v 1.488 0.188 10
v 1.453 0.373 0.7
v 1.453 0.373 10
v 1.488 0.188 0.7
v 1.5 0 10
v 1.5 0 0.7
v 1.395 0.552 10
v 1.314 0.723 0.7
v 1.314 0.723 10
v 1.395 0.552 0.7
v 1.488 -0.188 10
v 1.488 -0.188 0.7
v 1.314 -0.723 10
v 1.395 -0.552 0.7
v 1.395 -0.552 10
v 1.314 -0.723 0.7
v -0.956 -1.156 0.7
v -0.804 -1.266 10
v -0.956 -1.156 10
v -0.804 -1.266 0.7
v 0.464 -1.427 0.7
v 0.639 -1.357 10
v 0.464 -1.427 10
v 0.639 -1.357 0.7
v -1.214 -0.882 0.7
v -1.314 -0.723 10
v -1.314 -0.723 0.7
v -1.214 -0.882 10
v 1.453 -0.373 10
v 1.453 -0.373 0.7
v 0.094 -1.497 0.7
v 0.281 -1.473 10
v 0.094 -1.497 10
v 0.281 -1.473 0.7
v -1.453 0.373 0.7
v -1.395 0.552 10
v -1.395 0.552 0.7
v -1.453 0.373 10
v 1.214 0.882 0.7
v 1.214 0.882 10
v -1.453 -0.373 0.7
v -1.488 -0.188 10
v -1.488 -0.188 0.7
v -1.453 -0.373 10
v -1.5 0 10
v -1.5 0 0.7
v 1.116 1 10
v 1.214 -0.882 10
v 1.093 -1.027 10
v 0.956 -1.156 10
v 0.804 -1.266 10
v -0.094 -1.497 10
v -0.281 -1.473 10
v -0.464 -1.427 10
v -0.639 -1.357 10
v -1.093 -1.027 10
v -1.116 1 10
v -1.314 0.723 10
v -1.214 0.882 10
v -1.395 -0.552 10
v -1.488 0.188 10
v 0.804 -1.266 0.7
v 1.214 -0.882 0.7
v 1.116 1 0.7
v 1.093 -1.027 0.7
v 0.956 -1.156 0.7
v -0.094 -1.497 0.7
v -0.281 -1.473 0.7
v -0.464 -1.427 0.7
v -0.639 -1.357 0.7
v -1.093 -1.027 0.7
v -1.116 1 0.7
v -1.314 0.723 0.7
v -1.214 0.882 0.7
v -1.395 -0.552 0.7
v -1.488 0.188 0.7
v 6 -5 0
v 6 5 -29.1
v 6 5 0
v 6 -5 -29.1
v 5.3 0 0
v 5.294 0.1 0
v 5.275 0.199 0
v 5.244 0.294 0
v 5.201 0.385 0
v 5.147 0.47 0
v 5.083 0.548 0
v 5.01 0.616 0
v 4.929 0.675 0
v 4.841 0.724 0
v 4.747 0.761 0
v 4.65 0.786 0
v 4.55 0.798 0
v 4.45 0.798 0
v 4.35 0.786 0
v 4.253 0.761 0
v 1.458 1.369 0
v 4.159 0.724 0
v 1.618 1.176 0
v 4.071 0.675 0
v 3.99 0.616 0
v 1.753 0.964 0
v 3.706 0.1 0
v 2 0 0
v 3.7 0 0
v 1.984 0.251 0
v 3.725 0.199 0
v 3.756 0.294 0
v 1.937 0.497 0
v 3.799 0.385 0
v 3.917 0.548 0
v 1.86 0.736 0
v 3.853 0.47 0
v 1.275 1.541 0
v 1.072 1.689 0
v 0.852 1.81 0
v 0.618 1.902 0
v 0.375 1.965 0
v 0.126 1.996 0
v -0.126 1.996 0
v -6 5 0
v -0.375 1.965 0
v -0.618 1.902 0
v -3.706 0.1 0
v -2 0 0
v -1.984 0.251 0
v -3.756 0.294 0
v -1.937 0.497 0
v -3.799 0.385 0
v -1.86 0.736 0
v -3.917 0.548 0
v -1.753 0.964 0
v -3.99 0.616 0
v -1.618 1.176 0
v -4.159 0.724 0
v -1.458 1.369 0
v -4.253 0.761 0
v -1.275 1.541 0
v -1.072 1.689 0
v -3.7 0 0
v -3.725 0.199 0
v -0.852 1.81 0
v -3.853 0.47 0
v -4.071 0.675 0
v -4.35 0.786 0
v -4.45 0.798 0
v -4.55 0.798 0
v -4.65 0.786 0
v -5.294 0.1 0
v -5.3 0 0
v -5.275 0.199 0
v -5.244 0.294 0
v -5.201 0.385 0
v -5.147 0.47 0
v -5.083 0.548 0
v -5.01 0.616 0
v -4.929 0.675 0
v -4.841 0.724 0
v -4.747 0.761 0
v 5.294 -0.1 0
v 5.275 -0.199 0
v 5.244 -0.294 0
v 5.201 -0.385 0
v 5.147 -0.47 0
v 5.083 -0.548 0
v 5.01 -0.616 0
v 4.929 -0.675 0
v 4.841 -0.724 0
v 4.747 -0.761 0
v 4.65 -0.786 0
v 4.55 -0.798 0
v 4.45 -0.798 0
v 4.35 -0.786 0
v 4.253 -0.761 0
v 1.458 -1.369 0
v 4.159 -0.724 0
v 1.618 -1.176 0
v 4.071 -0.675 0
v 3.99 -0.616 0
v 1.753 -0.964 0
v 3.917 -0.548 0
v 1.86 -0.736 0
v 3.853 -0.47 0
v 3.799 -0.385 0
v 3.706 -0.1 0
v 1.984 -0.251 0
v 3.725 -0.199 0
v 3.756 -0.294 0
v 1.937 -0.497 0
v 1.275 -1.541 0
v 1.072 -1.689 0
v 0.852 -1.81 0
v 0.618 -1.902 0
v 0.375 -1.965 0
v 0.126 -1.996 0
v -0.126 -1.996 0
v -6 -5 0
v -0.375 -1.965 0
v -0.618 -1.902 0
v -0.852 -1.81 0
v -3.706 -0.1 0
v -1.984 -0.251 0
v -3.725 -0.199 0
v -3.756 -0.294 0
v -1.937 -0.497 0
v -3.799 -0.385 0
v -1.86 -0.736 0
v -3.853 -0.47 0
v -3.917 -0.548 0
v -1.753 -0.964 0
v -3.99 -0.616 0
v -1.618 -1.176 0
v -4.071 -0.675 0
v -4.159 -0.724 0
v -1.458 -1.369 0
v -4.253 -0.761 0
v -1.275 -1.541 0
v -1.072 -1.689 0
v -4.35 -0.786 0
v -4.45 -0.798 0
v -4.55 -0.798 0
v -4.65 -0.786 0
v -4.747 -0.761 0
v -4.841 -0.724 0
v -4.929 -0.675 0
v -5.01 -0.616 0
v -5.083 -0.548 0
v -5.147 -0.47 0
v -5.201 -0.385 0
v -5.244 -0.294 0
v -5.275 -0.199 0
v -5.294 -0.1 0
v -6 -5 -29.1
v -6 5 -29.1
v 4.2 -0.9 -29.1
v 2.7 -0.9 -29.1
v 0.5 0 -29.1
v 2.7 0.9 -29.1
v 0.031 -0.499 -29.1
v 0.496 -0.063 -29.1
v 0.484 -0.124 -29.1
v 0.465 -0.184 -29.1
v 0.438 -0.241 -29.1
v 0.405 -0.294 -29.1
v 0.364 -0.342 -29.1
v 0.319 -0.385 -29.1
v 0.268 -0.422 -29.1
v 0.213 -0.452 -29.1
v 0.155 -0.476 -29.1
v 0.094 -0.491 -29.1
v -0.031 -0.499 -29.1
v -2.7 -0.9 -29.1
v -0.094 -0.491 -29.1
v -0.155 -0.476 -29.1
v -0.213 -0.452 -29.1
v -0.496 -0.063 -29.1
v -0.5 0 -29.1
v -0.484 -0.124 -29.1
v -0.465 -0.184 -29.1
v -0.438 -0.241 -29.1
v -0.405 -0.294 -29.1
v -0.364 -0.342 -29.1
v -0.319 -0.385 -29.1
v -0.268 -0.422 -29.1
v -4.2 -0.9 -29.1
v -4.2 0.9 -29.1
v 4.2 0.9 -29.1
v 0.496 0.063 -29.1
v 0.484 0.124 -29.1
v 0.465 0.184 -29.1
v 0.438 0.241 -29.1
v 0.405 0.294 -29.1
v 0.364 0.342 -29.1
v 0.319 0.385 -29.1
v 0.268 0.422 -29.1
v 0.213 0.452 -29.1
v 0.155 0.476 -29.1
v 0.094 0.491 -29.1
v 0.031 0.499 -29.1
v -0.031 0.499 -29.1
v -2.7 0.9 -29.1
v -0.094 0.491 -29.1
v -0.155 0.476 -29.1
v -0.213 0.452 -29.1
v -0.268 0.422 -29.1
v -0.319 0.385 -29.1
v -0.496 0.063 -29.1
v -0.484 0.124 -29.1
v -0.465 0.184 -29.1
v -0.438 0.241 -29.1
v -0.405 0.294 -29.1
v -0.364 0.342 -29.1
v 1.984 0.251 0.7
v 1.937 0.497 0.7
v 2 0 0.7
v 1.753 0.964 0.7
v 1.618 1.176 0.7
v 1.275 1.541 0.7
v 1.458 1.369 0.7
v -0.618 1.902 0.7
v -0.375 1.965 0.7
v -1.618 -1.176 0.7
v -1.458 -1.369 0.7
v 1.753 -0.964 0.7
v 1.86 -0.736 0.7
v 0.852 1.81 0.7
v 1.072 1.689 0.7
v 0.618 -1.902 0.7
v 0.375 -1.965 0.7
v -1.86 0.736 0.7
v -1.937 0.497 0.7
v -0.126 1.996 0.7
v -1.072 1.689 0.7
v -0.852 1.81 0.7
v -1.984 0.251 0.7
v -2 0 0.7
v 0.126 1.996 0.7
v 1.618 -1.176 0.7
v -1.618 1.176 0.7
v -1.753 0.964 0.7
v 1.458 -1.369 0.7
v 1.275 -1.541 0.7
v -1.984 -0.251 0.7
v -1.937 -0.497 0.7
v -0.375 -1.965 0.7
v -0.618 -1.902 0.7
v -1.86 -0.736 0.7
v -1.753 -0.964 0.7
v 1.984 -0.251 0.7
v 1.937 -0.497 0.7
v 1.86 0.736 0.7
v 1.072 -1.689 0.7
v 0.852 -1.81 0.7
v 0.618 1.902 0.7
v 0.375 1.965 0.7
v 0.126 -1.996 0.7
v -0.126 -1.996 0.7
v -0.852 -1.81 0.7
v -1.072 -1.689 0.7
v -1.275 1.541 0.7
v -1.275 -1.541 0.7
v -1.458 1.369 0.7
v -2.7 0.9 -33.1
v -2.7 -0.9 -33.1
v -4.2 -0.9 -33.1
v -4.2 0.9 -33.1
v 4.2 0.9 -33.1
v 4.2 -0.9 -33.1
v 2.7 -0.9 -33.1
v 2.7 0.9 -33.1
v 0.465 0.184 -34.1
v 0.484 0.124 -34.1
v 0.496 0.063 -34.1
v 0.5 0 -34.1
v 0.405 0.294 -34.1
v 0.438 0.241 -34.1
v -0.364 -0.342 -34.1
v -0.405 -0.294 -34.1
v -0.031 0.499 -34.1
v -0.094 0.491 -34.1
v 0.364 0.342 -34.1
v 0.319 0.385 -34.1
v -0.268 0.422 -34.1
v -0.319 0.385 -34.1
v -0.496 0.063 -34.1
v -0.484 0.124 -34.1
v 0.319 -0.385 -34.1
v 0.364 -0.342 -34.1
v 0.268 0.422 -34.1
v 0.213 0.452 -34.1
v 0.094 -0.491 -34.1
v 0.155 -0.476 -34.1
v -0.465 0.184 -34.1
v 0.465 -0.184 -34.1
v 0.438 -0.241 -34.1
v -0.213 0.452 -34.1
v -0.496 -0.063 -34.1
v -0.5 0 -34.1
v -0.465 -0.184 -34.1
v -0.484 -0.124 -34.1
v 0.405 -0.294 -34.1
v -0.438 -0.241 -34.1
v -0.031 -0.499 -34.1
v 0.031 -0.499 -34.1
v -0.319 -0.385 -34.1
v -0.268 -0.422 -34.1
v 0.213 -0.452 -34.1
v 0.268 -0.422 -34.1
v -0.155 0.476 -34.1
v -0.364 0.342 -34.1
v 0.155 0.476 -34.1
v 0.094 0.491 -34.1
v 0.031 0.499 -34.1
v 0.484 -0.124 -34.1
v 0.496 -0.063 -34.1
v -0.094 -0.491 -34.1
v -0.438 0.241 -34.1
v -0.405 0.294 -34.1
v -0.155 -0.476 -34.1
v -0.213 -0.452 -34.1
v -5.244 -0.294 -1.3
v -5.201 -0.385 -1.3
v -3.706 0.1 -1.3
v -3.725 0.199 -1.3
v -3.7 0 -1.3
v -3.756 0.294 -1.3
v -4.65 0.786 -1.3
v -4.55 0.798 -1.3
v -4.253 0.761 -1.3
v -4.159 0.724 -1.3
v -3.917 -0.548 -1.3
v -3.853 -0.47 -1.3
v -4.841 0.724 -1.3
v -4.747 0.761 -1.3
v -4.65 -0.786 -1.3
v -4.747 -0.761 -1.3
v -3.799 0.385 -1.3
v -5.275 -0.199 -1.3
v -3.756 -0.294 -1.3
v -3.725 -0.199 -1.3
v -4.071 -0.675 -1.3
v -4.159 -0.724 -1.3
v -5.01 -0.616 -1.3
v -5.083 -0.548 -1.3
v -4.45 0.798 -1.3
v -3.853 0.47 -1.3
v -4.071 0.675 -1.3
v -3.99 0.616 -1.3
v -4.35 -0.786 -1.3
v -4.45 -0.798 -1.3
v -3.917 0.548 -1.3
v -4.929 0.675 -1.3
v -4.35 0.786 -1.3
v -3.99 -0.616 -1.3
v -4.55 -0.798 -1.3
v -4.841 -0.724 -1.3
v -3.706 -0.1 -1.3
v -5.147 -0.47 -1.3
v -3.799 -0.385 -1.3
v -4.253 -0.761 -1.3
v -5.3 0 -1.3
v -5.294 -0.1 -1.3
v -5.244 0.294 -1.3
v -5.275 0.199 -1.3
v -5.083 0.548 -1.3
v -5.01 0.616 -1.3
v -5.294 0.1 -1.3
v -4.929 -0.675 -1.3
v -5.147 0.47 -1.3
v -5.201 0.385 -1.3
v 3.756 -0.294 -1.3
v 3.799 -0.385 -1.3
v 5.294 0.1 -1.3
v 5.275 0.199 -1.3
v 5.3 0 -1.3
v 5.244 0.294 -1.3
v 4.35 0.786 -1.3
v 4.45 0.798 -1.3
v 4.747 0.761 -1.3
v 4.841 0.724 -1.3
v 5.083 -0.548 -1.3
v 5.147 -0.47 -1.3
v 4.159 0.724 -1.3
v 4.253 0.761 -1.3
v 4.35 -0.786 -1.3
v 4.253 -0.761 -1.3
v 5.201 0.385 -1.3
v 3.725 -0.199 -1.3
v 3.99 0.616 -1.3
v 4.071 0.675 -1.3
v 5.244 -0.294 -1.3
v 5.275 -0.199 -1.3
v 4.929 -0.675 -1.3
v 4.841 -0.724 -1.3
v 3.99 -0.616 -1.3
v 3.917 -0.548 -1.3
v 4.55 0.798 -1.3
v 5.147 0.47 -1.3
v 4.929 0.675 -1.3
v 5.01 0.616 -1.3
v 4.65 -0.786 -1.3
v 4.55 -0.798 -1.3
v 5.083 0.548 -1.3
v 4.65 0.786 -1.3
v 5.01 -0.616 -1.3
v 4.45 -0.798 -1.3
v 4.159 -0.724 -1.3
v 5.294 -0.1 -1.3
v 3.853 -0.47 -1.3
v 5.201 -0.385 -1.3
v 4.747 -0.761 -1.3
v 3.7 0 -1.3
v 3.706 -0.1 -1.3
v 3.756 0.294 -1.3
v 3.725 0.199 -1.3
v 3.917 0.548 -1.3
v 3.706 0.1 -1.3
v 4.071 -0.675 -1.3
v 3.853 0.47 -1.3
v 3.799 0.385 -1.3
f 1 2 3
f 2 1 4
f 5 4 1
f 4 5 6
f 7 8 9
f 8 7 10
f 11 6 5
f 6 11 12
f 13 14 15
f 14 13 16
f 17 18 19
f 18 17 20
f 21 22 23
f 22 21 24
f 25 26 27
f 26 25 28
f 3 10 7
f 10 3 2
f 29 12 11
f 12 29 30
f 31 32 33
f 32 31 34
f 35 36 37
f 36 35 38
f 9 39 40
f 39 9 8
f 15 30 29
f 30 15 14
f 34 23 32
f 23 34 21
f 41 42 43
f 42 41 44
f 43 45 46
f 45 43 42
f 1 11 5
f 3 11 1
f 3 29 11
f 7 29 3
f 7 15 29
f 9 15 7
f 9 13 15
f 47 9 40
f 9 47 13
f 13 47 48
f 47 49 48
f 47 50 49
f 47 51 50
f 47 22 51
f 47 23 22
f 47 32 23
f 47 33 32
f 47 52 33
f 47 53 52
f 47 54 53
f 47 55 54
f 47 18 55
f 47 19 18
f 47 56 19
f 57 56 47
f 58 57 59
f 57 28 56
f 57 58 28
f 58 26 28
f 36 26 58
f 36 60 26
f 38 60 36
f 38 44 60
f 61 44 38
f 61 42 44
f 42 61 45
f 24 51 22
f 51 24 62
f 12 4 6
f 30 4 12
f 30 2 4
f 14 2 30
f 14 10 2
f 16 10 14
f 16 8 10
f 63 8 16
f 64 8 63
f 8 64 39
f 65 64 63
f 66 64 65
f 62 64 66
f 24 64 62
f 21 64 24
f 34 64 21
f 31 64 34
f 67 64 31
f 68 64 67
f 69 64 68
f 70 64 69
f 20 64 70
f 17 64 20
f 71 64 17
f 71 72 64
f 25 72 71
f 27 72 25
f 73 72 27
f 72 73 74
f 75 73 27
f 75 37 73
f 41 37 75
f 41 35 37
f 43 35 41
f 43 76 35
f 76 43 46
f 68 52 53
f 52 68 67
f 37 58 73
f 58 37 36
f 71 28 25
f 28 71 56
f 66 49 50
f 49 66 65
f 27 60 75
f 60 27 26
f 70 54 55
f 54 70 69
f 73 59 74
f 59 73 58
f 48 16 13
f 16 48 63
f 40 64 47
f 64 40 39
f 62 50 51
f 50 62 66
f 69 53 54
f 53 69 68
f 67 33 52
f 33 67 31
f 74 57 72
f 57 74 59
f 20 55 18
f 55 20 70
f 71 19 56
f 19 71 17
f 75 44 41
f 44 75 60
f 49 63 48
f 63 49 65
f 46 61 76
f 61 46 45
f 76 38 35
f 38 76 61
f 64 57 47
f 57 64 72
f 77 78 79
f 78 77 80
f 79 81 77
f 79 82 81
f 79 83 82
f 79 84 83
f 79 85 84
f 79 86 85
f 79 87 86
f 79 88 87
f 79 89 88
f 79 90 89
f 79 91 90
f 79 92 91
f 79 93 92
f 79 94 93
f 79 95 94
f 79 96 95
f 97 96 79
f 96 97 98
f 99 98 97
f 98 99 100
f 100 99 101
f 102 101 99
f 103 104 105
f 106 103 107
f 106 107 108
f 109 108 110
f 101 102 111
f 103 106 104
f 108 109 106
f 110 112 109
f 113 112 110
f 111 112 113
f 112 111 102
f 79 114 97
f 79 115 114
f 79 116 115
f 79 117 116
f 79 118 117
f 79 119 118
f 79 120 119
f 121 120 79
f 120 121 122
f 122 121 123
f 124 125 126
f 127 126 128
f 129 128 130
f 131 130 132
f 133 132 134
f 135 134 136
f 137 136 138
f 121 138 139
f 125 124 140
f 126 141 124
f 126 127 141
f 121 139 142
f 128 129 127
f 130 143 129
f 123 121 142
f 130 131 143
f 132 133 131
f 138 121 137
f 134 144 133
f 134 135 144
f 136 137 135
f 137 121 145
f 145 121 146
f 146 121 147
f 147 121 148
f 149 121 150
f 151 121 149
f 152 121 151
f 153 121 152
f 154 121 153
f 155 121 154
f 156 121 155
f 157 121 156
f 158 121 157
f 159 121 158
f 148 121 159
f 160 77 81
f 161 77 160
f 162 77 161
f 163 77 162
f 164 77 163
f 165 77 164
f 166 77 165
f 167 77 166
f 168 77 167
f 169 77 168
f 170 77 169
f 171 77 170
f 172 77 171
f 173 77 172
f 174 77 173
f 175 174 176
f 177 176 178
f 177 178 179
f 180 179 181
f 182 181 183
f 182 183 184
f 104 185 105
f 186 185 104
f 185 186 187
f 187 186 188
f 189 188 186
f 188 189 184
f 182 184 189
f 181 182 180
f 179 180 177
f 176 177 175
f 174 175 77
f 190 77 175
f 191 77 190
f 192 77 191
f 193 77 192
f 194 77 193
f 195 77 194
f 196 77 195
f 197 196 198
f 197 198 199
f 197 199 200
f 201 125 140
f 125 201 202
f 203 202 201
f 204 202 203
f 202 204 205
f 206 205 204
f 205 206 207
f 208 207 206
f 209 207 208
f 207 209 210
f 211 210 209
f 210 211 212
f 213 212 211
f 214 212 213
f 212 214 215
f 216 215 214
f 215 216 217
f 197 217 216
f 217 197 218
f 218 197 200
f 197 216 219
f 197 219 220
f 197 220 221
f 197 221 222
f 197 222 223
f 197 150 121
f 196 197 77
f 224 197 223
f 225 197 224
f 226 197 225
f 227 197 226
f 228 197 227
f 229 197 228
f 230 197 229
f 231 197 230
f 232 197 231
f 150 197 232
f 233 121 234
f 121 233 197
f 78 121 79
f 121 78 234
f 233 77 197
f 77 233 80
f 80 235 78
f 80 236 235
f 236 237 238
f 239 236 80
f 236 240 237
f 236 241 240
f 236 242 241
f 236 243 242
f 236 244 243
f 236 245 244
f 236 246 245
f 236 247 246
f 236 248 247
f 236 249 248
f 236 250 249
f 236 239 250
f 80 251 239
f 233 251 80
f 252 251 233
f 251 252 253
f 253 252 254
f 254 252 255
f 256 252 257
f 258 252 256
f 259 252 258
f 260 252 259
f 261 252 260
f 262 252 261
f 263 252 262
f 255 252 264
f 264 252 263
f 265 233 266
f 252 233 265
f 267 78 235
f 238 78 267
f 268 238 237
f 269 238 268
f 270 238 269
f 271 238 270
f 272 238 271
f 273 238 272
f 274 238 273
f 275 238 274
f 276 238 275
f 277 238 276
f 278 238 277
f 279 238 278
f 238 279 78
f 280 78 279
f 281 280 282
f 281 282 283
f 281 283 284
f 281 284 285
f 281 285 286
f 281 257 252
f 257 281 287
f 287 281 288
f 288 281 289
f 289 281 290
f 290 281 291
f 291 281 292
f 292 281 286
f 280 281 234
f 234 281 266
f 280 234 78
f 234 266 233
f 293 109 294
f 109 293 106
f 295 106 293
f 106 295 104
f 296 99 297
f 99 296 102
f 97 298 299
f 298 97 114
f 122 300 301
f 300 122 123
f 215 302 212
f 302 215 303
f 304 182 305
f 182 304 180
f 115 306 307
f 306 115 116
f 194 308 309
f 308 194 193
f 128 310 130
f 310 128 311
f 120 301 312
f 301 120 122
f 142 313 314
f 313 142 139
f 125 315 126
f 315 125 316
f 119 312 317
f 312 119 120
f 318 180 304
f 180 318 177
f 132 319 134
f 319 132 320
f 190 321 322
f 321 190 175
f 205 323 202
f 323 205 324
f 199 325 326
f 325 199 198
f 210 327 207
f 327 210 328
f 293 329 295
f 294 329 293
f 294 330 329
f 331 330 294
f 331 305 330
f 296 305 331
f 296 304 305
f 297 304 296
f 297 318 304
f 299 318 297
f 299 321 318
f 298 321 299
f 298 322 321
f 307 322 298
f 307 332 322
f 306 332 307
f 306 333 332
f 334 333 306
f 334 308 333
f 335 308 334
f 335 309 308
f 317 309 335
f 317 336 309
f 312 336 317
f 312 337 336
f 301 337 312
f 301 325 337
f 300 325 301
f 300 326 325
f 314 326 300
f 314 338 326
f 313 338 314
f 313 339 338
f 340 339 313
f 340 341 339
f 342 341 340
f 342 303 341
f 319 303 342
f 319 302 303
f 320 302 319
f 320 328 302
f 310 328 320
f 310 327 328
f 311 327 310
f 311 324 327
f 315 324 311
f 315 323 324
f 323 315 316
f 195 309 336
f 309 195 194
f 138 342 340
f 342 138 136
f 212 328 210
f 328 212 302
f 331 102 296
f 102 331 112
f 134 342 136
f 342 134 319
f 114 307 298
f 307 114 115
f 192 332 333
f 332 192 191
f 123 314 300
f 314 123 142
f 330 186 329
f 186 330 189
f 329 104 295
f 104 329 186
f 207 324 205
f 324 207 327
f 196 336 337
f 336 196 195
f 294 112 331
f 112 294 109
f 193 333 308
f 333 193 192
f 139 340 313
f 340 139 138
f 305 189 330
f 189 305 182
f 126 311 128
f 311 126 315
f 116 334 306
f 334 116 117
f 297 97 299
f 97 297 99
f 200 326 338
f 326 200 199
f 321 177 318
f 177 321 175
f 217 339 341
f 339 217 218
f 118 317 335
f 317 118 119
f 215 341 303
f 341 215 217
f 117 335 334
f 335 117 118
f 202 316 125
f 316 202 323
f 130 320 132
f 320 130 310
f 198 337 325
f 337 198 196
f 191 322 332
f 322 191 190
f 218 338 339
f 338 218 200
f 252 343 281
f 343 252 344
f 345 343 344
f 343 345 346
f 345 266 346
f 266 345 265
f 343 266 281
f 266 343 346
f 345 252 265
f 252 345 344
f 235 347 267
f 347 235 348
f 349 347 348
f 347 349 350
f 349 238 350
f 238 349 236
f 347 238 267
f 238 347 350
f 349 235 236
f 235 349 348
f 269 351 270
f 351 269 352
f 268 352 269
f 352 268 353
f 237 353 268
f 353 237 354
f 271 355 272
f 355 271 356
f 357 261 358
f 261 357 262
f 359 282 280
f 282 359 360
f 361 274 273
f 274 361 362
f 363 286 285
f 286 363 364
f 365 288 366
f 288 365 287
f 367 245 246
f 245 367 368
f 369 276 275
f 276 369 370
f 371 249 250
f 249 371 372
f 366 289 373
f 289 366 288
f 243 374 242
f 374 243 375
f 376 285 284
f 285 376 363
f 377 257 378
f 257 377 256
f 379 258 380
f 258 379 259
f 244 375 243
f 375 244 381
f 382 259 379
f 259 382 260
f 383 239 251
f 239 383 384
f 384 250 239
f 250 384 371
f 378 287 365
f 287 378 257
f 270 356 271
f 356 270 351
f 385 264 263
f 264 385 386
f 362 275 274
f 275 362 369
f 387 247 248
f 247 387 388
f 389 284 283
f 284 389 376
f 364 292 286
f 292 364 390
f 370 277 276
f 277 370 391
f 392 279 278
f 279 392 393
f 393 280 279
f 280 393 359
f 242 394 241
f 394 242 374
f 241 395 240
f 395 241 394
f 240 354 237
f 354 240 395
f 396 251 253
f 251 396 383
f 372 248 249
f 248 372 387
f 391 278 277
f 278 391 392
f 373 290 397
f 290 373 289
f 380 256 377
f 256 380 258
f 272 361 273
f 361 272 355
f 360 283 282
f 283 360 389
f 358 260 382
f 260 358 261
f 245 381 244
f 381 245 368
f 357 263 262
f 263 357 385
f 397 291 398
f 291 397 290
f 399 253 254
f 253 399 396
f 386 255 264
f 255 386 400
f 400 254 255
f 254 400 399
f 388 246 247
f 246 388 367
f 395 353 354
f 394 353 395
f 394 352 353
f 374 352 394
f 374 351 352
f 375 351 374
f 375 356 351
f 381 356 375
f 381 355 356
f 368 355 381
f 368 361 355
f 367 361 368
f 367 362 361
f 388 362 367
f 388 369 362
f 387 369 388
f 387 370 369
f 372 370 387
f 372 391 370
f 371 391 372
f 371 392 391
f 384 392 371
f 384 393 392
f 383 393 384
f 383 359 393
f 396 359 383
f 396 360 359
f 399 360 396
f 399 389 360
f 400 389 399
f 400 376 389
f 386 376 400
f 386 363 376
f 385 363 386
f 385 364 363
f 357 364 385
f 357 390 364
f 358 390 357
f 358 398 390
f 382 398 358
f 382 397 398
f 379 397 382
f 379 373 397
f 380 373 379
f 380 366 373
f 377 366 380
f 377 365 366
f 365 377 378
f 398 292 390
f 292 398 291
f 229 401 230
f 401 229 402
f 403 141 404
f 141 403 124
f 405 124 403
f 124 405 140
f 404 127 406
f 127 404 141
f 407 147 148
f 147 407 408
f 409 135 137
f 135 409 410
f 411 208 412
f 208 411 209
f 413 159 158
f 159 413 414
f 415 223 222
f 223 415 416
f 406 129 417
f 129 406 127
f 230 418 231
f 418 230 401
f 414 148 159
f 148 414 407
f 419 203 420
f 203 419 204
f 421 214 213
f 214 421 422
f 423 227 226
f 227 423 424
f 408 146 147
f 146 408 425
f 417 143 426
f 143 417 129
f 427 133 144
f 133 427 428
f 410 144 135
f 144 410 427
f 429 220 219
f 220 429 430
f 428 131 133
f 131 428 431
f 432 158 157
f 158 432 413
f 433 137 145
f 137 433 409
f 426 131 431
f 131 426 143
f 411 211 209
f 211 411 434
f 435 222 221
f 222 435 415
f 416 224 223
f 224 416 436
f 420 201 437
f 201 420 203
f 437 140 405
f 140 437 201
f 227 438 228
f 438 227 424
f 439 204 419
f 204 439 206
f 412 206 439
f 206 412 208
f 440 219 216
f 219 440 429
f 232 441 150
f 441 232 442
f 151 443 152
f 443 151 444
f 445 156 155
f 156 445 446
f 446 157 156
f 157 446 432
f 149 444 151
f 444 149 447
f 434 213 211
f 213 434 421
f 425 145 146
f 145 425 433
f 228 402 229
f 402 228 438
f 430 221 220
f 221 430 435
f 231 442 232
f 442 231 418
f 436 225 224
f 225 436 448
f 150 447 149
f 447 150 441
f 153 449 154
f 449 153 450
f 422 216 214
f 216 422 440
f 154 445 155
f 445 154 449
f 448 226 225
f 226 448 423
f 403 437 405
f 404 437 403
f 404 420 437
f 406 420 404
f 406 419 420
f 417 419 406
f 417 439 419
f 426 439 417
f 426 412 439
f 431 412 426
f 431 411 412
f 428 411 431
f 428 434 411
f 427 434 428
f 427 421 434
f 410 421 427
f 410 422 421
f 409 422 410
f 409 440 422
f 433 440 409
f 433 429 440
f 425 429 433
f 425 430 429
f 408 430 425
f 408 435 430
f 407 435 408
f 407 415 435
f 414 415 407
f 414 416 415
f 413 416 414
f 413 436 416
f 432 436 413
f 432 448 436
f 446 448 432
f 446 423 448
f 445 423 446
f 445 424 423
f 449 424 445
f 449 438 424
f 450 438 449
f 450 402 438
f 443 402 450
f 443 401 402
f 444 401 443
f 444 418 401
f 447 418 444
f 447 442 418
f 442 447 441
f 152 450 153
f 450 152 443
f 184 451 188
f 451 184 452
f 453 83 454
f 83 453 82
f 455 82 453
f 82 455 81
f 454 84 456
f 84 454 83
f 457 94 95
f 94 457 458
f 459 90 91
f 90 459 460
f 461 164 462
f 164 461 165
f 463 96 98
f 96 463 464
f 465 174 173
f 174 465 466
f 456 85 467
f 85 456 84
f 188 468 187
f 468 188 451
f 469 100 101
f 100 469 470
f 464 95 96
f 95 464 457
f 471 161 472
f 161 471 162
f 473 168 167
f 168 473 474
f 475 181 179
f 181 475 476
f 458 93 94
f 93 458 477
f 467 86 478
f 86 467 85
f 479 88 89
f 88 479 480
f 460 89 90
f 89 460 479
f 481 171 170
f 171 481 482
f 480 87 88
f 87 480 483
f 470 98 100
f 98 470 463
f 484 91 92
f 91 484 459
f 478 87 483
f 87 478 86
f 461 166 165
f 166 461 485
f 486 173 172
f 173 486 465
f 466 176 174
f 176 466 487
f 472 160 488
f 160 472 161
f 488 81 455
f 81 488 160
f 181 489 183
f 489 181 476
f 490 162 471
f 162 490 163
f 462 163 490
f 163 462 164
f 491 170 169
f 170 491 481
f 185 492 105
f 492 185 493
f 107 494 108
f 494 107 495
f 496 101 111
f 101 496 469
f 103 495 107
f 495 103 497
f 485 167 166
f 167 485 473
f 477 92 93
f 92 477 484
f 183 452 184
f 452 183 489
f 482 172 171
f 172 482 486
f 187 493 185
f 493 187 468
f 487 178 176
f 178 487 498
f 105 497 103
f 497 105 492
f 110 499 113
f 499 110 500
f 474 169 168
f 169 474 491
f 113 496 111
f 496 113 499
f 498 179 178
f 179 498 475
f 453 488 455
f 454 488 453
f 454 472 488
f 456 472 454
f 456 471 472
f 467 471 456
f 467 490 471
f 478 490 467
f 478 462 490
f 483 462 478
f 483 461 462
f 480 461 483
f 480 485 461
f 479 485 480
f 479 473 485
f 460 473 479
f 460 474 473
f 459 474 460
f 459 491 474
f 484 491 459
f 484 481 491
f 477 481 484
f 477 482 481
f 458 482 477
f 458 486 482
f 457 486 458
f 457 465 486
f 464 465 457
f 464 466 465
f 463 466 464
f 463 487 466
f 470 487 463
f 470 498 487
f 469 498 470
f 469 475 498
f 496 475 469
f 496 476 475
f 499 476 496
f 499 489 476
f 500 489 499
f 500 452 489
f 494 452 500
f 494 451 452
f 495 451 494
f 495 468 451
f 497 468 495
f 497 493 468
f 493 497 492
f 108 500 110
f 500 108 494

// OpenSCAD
$fn = 50;

difference() {
	union() {
		translate(v = [0, 0, 0.7]) {
			rotate(a = [0, 0, 0]) {
				difference() {
					union() {
						cylinder(h = 9.3, r = 1.5);
					}
					union() {
						translate(v = [-6.0, 1.0, -1]) {
							cube(size = [12, 12, 11.3]);
						}
					}
				}
			}
		}
		translate(v = [-6.0, -5.0, -9]) {
			cube(size = [12, 10, 9]);
		}
		translate(v = [-6.0, -5.0, -29.1]) {
			cube(size = [12, 10, 20.1]);
		}
		cylinder(h = 0.7, r = 2.0);
		translate(v = [-4.2, -0.9, -33.1]) {
			cube(size = [1.5, 1.8, 4]);
		}
		translate(v = [2.7, -0.9, -33.1]) {
			cube(size = [1.5, 1.8, 4]);
		}
		translate(v = [0, 0, -34.1]) {
			cylinder(h = 5, r = 0.5);
		}
	}
	union() {
		translate(v = [-4.5, 0, -1.3]) {
			cylinder(h = 1.31, r = 0.8);
		}
		translate(v = [4.5, 0, -1.3]) {
			cylinder(h = 1.31, r = 0.8);
		}
	}
}
